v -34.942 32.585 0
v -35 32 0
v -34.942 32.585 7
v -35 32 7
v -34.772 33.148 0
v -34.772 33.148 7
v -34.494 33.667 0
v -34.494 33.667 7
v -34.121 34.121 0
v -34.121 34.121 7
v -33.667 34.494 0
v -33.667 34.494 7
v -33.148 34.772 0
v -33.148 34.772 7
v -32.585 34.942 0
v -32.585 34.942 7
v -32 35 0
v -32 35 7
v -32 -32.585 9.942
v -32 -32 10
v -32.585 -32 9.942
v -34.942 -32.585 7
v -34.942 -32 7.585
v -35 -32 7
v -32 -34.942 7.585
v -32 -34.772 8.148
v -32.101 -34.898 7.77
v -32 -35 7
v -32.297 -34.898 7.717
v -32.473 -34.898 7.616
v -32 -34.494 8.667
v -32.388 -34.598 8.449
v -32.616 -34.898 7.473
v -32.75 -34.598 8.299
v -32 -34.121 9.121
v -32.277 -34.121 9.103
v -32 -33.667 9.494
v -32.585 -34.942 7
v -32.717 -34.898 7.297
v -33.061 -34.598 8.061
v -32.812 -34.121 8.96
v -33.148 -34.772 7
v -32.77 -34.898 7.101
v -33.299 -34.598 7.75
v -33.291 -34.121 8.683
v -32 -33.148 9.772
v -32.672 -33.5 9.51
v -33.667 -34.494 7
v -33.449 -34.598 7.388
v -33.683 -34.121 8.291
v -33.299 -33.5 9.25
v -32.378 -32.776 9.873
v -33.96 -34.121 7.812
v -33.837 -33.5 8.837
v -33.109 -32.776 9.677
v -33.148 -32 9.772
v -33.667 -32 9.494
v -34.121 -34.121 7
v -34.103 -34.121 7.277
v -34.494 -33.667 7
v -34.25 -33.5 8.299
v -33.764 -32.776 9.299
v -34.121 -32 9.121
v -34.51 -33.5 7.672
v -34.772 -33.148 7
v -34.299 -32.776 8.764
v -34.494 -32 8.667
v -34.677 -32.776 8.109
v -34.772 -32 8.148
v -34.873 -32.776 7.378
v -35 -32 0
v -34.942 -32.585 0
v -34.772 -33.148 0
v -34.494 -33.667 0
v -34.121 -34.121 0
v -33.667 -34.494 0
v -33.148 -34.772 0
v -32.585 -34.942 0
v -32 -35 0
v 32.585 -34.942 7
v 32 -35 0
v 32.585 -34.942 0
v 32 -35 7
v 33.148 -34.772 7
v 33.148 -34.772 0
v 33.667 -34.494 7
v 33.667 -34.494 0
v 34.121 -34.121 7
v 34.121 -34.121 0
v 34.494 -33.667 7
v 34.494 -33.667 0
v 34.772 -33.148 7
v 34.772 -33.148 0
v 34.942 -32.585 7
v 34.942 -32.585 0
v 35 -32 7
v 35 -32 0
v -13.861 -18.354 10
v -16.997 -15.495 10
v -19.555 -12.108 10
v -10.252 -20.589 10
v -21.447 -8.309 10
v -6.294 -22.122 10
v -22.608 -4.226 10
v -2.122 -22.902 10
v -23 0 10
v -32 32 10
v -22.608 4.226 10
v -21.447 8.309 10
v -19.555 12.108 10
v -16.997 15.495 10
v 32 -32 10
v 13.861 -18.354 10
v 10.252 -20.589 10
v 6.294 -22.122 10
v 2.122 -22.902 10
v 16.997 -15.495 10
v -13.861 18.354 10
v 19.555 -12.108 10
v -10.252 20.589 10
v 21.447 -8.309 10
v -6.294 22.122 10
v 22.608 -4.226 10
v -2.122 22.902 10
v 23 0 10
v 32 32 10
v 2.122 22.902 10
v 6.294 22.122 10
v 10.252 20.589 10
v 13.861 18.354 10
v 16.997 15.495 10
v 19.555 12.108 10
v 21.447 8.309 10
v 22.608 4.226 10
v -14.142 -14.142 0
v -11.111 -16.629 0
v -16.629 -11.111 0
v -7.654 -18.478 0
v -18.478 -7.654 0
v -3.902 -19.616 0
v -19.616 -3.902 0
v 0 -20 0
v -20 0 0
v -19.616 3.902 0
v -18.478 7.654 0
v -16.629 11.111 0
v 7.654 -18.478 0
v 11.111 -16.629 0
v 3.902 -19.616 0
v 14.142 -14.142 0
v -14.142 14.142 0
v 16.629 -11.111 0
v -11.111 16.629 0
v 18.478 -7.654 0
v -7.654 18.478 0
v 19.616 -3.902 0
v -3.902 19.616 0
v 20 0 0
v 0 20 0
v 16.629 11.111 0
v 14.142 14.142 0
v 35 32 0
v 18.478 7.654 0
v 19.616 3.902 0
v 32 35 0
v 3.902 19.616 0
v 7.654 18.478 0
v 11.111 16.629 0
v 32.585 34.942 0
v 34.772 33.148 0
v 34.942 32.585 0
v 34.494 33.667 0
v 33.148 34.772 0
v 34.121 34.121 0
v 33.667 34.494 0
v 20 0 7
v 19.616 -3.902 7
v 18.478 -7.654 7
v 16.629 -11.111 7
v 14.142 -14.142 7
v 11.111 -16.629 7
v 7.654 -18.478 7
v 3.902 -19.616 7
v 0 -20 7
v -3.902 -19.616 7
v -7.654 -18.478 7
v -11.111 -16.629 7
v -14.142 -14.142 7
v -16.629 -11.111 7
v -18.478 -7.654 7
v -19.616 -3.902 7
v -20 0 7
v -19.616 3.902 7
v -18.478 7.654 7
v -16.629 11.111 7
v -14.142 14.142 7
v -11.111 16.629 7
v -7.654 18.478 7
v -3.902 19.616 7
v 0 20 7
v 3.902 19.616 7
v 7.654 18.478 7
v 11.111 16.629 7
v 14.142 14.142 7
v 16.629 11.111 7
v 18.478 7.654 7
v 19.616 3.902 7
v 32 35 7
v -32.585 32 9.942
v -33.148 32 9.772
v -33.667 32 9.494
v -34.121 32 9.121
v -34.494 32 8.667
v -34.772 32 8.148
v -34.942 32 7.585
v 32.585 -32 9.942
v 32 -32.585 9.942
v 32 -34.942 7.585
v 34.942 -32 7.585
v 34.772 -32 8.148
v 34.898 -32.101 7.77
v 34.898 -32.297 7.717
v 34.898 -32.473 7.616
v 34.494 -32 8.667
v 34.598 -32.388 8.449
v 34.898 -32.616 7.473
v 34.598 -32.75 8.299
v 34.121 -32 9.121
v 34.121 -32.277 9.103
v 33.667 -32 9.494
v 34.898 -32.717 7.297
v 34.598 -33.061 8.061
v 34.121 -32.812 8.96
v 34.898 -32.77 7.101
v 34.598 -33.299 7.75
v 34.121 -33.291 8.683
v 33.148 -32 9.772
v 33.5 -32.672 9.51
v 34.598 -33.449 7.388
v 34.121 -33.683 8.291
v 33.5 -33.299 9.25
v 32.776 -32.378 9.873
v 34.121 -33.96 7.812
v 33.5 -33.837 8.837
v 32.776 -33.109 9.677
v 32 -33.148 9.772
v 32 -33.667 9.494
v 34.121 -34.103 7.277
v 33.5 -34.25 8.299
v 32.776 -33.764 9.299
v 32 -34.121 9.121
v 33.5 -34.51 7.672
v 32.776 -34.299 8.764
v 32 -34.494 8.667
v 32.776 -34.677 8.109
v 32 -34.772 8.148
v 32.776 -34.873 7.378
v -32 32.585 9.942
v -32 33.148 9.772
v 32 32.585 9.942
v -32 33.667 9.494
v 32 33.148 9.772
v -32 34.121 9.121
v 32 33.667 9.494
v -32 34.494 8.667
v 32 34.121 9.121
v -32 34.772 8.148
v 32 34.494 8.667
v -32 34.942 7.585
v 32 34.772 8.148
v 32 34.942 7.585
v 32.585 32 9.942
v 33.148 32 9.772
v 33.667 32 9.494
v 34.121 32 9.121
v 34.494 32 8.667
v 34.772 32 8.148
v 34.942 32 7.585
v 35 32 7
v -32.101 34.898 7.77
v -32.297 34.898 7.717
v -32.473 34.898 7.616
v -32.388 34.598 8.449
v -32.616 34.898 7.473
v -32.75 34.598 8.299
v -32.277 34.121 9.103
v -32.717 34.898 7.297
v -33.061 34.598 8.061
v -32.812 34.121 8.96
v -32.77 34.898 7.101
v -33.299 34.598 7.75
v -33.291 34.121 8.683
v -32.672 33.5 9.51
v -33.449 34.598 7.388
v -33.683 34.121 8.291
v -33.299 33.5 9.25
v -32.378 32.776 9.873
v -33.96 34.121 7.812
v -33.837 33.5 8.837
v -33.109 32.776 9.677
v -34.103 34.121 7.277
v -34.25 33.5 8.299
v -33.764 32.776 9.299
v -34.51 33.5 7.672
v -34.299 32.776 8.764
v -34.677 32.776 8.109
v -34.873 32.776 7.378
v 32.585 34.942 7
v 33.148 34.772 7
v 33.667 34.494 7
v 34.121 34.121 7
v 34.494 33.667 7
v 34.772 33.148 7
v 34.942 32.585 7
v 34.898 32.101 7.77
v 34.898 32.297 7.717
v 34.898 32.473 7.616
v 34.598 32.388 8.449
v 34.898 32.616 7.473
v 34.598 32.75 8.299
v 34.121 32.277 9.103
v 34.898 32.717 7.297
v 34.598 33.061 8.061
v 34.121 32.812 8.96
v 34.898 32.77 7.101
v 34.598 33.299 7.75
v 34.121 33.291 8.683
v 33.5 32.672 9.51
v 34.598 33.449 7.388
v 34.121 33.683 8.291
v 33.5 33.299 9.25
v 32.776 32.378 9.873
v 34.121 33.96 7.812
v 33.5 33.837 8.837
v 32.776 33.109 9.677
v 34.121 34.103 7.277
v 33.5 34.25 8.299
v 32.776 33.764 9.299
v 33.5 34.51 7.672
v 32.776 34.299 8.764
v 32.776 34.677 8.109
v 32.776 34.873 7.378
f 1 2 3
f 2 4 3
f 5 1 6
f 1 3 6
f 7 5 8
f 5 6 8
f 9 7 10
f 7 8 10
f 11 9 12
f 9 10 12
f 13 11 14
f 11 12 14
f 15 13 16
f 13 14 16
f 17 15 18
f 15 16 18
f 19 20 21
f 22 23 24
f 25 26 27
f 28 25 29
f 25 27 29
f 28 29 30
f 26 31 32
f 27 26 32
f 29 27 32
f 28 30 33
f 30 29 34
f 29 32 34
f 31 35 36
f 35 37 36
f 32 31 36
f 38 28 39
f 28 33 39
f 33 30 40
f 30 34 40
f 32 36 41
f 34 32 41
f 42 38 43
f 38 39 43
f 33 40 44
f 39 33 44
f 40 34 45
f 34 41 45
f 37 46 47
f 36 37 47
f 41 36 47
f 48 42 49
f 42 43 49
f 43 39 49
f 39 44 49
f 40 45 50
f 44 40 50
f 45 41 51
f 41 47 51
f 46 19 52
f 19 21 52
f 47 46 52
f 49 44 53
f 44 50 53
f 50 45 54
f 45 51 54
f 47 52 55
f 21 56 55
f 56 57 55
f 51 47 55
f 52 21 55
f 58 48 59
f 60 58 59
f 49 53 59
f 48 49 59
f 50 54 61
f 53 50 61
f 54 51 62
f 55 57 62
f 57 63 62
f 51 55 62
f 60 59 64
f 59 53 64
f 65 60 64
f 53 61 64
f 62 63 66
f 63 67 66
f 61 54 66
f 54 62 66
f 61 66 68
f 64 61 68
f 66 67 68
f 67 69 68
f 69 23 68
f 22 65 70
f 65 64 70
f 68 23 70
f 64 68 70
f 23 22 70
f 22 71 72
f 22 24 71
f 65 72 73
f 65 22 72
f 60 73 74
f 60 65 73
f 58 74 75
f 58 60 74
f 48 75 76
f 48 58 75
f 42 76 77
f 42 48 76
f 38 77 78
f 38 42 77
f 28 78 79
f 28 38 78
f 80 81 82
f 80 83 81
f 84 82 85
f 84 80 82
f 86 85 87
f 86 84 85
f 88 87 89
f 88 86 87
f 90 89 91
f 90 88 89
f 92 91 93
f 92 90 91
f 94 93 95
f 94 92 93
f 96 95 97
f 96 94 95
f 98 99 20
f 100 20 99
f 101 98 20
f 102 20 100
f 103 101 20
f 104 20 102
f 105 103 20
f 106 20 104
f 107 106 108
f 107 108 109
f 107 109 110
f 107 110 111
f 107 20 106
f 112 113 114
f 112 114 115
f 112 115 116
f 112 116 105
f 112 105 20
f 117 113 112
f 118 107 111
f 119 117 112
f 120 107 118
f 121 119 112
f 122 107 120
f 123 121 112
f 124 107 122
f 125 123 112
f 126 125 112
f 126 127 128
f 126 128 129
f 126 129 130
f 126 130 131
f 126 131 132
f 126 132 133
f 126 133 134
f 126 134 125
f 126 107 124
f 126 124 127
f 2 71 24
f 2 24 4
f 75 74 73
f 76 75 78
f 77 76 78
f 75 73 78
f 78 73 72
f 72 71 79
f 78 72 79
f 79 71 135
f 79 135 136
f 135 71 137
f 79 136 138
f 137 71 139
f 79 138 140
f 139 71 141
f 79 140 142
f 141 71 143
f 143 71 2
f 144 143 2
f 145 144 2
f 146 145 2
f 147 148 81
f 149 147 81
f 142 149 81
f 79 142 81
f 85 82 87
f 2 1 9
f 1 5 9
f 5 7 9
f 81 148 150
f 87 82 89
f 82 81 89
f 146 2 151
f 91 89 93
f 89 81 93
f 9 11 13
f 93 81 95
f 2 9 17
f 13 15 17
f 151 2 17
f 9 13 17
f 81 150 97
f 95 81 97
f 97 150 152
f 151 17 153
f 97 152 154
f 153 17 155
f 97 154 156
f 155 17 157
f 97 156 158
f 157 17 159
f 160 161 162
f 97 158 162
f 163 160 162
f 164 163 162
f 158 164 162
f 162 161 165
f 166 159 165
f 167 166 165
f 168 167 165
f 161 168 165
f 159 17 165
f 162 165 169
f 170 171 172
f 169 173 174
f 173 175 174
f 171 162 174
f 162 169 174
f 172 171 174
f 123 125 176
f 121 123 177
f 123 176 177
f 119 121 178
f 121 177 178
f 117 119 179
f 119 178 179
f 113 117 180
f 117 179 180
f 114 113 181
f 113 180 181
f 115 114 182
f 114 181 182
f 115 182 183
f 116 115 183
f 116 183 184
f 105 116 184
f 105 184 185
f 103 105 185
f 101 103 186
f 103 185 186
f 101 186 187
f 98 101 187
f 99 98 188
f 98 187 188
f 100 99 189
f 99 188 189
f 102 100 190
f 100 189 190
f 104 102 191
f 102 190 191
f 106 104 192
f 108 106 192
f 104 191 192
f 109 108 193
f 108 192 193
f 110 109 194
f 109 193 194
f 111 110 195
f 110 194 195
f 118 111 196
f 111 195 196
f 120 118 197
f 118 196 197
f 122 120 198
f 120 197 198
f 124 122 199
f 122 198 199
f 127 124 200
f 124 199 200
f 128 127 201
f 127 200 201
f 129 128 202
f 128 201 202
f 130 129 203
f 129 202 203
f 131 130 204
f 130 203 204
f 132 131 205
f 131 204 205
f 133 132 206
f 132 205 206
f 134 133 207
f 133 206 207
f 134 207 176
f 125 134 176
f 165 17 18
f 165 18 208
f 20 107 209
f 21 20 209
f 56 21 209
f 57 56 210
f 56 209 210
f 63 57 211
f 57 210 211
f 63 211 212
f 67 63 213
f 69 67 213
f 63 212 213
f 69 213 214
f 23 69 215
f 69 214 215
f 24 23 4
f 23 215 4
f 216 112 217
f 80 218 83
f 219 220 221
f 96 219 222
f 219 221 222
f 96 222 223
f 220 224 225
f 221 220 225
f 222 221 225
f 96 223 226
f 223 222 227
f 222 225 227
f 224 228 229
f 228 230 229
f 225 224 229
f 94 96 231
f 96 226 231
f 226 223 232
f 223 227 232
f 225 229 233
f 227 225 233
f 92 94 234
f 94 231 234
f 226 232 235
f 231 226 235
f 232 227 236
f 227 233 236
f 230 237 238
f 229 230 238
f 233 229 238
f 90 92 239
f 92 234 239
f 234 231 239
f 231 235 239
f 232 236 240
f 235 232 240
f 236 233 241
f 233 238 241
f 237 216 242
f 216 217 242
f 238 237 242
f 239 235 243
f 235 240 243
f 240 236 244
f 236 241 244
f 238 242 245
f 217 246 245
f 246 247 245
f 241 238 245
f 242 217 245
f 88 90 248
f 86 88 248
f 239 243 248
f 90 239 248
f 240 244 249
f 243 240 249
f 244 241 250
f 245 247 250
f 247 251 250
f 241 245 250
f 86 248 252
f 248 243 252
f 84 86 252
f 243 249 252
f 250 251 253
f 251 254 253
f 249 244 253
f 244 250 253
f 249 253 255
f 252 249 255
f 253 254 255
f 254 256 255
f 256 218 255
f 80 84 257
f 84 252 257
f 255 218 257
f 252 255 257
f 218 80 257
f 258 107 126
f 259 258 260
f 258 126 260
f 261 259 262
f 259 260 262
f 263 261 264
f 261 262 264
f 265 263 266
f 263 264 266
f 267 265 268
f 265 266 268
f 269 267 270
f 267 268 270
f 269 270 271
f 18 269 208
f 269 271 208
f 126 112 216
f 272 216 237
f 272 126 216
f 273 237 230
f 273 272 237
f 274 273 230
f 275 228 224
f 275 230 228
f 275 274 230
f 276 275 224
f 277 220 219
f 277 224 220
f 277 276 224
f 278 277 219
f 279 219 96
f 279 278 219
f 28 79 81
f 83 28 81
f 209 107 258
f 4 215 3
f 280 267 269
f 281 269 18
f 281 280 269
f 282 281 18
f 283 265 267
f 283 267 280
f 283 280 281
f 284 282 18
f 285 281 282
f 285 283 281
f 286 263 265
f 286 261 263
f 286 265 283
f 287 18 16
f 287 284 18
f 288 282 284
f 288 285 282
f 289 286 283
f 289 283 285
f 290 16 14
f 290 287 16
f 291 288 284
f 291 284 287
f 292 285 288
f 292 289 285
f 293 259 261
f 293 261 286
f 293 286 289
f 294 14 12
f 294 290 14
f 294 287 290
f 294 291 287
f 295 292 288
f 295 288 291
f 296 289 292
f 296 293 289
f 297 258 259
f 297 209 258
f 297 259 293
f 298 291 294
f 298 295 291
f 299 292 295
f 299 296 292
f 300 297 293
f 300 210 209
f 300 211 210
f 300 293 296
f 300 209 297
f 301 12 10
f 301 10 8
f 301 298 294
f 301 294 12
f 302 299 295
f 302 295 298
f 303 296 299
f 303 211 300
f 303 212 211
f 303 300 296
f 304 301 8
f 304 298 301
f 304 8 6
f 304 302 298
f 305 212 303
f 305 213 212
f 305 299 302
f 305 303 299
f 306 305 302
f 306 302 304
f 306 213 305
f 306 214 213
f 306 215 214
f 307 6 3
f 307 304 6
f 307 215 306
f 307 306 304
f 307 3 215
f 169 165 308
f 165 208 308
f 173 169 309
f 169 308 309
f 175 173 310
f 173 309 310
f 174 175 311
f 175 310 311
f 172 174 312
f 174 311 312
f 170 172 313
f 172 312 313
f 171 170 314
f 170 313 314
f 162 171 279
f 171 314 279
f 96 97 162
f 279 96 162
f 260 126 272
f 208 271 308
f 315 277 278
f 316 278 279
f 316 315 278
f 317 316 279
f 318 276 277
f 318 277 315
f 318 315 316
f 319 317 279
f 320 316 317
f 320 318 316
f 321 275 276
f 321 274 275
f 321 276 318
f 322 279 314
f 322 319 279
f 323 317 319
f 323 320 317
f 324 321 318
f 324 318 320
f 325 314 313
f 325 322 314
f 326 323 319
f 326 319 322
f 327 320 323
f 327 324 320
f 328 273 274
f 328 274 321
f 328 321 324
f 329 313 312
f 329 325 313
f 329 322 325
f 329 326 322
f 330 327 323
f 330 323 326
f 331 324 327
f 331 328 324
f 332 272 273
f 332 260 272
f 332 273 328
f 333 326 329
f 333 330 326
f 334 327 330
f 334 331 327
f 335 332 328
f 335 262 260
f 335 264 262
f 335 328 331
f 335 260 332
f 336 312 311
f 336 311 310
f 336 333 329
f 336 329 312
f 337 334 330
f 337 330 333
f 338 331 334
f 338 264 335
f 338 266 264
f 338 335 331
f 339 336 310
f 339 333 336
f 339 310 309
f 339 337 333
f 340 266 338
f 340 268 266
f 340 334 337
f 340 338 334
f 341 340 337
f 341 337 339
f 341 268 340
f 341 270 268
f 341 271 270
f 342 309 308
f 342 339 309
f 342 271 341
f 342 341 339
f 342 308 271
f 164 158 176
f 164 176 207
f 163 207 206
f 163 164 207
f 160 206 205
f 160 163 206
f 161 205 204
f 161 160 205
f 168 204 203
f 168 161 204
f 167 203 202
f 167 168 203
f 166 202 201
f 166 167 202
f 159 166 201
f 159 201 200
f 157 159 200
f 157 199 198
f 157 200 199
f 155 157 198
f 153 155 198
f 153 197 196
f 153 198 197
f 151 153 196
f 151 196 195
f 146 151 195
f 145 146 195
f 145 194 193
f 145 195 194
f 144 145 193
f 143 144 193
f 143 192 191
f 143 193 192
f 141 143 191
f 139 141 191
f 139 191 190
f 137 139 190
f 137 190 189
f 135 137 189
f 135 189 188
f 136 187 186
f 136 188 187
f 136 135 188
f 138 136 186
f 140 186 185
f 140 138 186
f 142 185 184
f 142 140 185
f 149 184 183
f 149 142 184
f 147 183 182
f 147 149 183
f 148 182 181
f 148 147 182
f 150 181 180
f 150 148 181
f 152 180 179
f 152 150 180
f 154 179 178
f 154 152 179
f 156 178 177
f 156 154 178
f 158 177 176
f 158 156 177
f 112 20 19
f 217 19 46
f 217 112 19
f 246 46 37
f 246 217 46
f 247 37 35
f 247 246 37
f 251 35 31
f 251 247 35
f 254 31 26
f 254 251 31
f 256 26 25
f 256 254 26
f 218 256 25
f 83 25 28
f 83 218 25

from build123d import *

# Parameters (mm, degrees)
CYLINDER_R     = 20
CYLINDER_DEPTH = 20
BOX_W          = 70
BOX_H          = 70
BOX_DEPTH      = 10
CHAMFER_SIZE   = 3
FILLET_R       = 3


with BuildPart() as cylinder:
    # Cylinder → Cylinder (new body)
    with BuildSketch(Plane.XY.offset(-1)):
        Circle(CYLINDER_R)
    extrude(amount=CYLINDER_DEPTH)


with BuildPart() as fillet_body:
    # Box → Box (new body)
    with BuildSketch(Plane(origin=(-35, -35, 0), x_dir=(1, 0, 0), z_dir=(0, 0, 1))):
        with Locations((35, 35)):
            Rectangle(BOX_W, BOX_H)
    extrude(amount=BOX_DEPTH)

    # Cut: cut Cylinder
    add(cylinder.part, mode=Mode.SUBTRACT)

    # Chamfer
    chamfer_edges = [fillet_body.edges().sort_by_distance(p)[0] for p in [
        (-20, 0, 10),
    ]]
    chamfer(chamfer_edges, length=CHAMFER_SIZE)

    # Fillet
    fillet_edges = [fillet_body.edges().sort_by_distance(p)[0] for p in [
        (-35, 0, 10),
        (0, 35, 10),
        (0, -35, 10),
        (35, 0, 10),
        (-35, -35, 5),
        (-35, 35, 5),
        (35, 35, 5),
        (35, -35, 5),
    ]]
    fillet(fillet_edges, radius=FILLET_R)


solid = fillet_body.part
